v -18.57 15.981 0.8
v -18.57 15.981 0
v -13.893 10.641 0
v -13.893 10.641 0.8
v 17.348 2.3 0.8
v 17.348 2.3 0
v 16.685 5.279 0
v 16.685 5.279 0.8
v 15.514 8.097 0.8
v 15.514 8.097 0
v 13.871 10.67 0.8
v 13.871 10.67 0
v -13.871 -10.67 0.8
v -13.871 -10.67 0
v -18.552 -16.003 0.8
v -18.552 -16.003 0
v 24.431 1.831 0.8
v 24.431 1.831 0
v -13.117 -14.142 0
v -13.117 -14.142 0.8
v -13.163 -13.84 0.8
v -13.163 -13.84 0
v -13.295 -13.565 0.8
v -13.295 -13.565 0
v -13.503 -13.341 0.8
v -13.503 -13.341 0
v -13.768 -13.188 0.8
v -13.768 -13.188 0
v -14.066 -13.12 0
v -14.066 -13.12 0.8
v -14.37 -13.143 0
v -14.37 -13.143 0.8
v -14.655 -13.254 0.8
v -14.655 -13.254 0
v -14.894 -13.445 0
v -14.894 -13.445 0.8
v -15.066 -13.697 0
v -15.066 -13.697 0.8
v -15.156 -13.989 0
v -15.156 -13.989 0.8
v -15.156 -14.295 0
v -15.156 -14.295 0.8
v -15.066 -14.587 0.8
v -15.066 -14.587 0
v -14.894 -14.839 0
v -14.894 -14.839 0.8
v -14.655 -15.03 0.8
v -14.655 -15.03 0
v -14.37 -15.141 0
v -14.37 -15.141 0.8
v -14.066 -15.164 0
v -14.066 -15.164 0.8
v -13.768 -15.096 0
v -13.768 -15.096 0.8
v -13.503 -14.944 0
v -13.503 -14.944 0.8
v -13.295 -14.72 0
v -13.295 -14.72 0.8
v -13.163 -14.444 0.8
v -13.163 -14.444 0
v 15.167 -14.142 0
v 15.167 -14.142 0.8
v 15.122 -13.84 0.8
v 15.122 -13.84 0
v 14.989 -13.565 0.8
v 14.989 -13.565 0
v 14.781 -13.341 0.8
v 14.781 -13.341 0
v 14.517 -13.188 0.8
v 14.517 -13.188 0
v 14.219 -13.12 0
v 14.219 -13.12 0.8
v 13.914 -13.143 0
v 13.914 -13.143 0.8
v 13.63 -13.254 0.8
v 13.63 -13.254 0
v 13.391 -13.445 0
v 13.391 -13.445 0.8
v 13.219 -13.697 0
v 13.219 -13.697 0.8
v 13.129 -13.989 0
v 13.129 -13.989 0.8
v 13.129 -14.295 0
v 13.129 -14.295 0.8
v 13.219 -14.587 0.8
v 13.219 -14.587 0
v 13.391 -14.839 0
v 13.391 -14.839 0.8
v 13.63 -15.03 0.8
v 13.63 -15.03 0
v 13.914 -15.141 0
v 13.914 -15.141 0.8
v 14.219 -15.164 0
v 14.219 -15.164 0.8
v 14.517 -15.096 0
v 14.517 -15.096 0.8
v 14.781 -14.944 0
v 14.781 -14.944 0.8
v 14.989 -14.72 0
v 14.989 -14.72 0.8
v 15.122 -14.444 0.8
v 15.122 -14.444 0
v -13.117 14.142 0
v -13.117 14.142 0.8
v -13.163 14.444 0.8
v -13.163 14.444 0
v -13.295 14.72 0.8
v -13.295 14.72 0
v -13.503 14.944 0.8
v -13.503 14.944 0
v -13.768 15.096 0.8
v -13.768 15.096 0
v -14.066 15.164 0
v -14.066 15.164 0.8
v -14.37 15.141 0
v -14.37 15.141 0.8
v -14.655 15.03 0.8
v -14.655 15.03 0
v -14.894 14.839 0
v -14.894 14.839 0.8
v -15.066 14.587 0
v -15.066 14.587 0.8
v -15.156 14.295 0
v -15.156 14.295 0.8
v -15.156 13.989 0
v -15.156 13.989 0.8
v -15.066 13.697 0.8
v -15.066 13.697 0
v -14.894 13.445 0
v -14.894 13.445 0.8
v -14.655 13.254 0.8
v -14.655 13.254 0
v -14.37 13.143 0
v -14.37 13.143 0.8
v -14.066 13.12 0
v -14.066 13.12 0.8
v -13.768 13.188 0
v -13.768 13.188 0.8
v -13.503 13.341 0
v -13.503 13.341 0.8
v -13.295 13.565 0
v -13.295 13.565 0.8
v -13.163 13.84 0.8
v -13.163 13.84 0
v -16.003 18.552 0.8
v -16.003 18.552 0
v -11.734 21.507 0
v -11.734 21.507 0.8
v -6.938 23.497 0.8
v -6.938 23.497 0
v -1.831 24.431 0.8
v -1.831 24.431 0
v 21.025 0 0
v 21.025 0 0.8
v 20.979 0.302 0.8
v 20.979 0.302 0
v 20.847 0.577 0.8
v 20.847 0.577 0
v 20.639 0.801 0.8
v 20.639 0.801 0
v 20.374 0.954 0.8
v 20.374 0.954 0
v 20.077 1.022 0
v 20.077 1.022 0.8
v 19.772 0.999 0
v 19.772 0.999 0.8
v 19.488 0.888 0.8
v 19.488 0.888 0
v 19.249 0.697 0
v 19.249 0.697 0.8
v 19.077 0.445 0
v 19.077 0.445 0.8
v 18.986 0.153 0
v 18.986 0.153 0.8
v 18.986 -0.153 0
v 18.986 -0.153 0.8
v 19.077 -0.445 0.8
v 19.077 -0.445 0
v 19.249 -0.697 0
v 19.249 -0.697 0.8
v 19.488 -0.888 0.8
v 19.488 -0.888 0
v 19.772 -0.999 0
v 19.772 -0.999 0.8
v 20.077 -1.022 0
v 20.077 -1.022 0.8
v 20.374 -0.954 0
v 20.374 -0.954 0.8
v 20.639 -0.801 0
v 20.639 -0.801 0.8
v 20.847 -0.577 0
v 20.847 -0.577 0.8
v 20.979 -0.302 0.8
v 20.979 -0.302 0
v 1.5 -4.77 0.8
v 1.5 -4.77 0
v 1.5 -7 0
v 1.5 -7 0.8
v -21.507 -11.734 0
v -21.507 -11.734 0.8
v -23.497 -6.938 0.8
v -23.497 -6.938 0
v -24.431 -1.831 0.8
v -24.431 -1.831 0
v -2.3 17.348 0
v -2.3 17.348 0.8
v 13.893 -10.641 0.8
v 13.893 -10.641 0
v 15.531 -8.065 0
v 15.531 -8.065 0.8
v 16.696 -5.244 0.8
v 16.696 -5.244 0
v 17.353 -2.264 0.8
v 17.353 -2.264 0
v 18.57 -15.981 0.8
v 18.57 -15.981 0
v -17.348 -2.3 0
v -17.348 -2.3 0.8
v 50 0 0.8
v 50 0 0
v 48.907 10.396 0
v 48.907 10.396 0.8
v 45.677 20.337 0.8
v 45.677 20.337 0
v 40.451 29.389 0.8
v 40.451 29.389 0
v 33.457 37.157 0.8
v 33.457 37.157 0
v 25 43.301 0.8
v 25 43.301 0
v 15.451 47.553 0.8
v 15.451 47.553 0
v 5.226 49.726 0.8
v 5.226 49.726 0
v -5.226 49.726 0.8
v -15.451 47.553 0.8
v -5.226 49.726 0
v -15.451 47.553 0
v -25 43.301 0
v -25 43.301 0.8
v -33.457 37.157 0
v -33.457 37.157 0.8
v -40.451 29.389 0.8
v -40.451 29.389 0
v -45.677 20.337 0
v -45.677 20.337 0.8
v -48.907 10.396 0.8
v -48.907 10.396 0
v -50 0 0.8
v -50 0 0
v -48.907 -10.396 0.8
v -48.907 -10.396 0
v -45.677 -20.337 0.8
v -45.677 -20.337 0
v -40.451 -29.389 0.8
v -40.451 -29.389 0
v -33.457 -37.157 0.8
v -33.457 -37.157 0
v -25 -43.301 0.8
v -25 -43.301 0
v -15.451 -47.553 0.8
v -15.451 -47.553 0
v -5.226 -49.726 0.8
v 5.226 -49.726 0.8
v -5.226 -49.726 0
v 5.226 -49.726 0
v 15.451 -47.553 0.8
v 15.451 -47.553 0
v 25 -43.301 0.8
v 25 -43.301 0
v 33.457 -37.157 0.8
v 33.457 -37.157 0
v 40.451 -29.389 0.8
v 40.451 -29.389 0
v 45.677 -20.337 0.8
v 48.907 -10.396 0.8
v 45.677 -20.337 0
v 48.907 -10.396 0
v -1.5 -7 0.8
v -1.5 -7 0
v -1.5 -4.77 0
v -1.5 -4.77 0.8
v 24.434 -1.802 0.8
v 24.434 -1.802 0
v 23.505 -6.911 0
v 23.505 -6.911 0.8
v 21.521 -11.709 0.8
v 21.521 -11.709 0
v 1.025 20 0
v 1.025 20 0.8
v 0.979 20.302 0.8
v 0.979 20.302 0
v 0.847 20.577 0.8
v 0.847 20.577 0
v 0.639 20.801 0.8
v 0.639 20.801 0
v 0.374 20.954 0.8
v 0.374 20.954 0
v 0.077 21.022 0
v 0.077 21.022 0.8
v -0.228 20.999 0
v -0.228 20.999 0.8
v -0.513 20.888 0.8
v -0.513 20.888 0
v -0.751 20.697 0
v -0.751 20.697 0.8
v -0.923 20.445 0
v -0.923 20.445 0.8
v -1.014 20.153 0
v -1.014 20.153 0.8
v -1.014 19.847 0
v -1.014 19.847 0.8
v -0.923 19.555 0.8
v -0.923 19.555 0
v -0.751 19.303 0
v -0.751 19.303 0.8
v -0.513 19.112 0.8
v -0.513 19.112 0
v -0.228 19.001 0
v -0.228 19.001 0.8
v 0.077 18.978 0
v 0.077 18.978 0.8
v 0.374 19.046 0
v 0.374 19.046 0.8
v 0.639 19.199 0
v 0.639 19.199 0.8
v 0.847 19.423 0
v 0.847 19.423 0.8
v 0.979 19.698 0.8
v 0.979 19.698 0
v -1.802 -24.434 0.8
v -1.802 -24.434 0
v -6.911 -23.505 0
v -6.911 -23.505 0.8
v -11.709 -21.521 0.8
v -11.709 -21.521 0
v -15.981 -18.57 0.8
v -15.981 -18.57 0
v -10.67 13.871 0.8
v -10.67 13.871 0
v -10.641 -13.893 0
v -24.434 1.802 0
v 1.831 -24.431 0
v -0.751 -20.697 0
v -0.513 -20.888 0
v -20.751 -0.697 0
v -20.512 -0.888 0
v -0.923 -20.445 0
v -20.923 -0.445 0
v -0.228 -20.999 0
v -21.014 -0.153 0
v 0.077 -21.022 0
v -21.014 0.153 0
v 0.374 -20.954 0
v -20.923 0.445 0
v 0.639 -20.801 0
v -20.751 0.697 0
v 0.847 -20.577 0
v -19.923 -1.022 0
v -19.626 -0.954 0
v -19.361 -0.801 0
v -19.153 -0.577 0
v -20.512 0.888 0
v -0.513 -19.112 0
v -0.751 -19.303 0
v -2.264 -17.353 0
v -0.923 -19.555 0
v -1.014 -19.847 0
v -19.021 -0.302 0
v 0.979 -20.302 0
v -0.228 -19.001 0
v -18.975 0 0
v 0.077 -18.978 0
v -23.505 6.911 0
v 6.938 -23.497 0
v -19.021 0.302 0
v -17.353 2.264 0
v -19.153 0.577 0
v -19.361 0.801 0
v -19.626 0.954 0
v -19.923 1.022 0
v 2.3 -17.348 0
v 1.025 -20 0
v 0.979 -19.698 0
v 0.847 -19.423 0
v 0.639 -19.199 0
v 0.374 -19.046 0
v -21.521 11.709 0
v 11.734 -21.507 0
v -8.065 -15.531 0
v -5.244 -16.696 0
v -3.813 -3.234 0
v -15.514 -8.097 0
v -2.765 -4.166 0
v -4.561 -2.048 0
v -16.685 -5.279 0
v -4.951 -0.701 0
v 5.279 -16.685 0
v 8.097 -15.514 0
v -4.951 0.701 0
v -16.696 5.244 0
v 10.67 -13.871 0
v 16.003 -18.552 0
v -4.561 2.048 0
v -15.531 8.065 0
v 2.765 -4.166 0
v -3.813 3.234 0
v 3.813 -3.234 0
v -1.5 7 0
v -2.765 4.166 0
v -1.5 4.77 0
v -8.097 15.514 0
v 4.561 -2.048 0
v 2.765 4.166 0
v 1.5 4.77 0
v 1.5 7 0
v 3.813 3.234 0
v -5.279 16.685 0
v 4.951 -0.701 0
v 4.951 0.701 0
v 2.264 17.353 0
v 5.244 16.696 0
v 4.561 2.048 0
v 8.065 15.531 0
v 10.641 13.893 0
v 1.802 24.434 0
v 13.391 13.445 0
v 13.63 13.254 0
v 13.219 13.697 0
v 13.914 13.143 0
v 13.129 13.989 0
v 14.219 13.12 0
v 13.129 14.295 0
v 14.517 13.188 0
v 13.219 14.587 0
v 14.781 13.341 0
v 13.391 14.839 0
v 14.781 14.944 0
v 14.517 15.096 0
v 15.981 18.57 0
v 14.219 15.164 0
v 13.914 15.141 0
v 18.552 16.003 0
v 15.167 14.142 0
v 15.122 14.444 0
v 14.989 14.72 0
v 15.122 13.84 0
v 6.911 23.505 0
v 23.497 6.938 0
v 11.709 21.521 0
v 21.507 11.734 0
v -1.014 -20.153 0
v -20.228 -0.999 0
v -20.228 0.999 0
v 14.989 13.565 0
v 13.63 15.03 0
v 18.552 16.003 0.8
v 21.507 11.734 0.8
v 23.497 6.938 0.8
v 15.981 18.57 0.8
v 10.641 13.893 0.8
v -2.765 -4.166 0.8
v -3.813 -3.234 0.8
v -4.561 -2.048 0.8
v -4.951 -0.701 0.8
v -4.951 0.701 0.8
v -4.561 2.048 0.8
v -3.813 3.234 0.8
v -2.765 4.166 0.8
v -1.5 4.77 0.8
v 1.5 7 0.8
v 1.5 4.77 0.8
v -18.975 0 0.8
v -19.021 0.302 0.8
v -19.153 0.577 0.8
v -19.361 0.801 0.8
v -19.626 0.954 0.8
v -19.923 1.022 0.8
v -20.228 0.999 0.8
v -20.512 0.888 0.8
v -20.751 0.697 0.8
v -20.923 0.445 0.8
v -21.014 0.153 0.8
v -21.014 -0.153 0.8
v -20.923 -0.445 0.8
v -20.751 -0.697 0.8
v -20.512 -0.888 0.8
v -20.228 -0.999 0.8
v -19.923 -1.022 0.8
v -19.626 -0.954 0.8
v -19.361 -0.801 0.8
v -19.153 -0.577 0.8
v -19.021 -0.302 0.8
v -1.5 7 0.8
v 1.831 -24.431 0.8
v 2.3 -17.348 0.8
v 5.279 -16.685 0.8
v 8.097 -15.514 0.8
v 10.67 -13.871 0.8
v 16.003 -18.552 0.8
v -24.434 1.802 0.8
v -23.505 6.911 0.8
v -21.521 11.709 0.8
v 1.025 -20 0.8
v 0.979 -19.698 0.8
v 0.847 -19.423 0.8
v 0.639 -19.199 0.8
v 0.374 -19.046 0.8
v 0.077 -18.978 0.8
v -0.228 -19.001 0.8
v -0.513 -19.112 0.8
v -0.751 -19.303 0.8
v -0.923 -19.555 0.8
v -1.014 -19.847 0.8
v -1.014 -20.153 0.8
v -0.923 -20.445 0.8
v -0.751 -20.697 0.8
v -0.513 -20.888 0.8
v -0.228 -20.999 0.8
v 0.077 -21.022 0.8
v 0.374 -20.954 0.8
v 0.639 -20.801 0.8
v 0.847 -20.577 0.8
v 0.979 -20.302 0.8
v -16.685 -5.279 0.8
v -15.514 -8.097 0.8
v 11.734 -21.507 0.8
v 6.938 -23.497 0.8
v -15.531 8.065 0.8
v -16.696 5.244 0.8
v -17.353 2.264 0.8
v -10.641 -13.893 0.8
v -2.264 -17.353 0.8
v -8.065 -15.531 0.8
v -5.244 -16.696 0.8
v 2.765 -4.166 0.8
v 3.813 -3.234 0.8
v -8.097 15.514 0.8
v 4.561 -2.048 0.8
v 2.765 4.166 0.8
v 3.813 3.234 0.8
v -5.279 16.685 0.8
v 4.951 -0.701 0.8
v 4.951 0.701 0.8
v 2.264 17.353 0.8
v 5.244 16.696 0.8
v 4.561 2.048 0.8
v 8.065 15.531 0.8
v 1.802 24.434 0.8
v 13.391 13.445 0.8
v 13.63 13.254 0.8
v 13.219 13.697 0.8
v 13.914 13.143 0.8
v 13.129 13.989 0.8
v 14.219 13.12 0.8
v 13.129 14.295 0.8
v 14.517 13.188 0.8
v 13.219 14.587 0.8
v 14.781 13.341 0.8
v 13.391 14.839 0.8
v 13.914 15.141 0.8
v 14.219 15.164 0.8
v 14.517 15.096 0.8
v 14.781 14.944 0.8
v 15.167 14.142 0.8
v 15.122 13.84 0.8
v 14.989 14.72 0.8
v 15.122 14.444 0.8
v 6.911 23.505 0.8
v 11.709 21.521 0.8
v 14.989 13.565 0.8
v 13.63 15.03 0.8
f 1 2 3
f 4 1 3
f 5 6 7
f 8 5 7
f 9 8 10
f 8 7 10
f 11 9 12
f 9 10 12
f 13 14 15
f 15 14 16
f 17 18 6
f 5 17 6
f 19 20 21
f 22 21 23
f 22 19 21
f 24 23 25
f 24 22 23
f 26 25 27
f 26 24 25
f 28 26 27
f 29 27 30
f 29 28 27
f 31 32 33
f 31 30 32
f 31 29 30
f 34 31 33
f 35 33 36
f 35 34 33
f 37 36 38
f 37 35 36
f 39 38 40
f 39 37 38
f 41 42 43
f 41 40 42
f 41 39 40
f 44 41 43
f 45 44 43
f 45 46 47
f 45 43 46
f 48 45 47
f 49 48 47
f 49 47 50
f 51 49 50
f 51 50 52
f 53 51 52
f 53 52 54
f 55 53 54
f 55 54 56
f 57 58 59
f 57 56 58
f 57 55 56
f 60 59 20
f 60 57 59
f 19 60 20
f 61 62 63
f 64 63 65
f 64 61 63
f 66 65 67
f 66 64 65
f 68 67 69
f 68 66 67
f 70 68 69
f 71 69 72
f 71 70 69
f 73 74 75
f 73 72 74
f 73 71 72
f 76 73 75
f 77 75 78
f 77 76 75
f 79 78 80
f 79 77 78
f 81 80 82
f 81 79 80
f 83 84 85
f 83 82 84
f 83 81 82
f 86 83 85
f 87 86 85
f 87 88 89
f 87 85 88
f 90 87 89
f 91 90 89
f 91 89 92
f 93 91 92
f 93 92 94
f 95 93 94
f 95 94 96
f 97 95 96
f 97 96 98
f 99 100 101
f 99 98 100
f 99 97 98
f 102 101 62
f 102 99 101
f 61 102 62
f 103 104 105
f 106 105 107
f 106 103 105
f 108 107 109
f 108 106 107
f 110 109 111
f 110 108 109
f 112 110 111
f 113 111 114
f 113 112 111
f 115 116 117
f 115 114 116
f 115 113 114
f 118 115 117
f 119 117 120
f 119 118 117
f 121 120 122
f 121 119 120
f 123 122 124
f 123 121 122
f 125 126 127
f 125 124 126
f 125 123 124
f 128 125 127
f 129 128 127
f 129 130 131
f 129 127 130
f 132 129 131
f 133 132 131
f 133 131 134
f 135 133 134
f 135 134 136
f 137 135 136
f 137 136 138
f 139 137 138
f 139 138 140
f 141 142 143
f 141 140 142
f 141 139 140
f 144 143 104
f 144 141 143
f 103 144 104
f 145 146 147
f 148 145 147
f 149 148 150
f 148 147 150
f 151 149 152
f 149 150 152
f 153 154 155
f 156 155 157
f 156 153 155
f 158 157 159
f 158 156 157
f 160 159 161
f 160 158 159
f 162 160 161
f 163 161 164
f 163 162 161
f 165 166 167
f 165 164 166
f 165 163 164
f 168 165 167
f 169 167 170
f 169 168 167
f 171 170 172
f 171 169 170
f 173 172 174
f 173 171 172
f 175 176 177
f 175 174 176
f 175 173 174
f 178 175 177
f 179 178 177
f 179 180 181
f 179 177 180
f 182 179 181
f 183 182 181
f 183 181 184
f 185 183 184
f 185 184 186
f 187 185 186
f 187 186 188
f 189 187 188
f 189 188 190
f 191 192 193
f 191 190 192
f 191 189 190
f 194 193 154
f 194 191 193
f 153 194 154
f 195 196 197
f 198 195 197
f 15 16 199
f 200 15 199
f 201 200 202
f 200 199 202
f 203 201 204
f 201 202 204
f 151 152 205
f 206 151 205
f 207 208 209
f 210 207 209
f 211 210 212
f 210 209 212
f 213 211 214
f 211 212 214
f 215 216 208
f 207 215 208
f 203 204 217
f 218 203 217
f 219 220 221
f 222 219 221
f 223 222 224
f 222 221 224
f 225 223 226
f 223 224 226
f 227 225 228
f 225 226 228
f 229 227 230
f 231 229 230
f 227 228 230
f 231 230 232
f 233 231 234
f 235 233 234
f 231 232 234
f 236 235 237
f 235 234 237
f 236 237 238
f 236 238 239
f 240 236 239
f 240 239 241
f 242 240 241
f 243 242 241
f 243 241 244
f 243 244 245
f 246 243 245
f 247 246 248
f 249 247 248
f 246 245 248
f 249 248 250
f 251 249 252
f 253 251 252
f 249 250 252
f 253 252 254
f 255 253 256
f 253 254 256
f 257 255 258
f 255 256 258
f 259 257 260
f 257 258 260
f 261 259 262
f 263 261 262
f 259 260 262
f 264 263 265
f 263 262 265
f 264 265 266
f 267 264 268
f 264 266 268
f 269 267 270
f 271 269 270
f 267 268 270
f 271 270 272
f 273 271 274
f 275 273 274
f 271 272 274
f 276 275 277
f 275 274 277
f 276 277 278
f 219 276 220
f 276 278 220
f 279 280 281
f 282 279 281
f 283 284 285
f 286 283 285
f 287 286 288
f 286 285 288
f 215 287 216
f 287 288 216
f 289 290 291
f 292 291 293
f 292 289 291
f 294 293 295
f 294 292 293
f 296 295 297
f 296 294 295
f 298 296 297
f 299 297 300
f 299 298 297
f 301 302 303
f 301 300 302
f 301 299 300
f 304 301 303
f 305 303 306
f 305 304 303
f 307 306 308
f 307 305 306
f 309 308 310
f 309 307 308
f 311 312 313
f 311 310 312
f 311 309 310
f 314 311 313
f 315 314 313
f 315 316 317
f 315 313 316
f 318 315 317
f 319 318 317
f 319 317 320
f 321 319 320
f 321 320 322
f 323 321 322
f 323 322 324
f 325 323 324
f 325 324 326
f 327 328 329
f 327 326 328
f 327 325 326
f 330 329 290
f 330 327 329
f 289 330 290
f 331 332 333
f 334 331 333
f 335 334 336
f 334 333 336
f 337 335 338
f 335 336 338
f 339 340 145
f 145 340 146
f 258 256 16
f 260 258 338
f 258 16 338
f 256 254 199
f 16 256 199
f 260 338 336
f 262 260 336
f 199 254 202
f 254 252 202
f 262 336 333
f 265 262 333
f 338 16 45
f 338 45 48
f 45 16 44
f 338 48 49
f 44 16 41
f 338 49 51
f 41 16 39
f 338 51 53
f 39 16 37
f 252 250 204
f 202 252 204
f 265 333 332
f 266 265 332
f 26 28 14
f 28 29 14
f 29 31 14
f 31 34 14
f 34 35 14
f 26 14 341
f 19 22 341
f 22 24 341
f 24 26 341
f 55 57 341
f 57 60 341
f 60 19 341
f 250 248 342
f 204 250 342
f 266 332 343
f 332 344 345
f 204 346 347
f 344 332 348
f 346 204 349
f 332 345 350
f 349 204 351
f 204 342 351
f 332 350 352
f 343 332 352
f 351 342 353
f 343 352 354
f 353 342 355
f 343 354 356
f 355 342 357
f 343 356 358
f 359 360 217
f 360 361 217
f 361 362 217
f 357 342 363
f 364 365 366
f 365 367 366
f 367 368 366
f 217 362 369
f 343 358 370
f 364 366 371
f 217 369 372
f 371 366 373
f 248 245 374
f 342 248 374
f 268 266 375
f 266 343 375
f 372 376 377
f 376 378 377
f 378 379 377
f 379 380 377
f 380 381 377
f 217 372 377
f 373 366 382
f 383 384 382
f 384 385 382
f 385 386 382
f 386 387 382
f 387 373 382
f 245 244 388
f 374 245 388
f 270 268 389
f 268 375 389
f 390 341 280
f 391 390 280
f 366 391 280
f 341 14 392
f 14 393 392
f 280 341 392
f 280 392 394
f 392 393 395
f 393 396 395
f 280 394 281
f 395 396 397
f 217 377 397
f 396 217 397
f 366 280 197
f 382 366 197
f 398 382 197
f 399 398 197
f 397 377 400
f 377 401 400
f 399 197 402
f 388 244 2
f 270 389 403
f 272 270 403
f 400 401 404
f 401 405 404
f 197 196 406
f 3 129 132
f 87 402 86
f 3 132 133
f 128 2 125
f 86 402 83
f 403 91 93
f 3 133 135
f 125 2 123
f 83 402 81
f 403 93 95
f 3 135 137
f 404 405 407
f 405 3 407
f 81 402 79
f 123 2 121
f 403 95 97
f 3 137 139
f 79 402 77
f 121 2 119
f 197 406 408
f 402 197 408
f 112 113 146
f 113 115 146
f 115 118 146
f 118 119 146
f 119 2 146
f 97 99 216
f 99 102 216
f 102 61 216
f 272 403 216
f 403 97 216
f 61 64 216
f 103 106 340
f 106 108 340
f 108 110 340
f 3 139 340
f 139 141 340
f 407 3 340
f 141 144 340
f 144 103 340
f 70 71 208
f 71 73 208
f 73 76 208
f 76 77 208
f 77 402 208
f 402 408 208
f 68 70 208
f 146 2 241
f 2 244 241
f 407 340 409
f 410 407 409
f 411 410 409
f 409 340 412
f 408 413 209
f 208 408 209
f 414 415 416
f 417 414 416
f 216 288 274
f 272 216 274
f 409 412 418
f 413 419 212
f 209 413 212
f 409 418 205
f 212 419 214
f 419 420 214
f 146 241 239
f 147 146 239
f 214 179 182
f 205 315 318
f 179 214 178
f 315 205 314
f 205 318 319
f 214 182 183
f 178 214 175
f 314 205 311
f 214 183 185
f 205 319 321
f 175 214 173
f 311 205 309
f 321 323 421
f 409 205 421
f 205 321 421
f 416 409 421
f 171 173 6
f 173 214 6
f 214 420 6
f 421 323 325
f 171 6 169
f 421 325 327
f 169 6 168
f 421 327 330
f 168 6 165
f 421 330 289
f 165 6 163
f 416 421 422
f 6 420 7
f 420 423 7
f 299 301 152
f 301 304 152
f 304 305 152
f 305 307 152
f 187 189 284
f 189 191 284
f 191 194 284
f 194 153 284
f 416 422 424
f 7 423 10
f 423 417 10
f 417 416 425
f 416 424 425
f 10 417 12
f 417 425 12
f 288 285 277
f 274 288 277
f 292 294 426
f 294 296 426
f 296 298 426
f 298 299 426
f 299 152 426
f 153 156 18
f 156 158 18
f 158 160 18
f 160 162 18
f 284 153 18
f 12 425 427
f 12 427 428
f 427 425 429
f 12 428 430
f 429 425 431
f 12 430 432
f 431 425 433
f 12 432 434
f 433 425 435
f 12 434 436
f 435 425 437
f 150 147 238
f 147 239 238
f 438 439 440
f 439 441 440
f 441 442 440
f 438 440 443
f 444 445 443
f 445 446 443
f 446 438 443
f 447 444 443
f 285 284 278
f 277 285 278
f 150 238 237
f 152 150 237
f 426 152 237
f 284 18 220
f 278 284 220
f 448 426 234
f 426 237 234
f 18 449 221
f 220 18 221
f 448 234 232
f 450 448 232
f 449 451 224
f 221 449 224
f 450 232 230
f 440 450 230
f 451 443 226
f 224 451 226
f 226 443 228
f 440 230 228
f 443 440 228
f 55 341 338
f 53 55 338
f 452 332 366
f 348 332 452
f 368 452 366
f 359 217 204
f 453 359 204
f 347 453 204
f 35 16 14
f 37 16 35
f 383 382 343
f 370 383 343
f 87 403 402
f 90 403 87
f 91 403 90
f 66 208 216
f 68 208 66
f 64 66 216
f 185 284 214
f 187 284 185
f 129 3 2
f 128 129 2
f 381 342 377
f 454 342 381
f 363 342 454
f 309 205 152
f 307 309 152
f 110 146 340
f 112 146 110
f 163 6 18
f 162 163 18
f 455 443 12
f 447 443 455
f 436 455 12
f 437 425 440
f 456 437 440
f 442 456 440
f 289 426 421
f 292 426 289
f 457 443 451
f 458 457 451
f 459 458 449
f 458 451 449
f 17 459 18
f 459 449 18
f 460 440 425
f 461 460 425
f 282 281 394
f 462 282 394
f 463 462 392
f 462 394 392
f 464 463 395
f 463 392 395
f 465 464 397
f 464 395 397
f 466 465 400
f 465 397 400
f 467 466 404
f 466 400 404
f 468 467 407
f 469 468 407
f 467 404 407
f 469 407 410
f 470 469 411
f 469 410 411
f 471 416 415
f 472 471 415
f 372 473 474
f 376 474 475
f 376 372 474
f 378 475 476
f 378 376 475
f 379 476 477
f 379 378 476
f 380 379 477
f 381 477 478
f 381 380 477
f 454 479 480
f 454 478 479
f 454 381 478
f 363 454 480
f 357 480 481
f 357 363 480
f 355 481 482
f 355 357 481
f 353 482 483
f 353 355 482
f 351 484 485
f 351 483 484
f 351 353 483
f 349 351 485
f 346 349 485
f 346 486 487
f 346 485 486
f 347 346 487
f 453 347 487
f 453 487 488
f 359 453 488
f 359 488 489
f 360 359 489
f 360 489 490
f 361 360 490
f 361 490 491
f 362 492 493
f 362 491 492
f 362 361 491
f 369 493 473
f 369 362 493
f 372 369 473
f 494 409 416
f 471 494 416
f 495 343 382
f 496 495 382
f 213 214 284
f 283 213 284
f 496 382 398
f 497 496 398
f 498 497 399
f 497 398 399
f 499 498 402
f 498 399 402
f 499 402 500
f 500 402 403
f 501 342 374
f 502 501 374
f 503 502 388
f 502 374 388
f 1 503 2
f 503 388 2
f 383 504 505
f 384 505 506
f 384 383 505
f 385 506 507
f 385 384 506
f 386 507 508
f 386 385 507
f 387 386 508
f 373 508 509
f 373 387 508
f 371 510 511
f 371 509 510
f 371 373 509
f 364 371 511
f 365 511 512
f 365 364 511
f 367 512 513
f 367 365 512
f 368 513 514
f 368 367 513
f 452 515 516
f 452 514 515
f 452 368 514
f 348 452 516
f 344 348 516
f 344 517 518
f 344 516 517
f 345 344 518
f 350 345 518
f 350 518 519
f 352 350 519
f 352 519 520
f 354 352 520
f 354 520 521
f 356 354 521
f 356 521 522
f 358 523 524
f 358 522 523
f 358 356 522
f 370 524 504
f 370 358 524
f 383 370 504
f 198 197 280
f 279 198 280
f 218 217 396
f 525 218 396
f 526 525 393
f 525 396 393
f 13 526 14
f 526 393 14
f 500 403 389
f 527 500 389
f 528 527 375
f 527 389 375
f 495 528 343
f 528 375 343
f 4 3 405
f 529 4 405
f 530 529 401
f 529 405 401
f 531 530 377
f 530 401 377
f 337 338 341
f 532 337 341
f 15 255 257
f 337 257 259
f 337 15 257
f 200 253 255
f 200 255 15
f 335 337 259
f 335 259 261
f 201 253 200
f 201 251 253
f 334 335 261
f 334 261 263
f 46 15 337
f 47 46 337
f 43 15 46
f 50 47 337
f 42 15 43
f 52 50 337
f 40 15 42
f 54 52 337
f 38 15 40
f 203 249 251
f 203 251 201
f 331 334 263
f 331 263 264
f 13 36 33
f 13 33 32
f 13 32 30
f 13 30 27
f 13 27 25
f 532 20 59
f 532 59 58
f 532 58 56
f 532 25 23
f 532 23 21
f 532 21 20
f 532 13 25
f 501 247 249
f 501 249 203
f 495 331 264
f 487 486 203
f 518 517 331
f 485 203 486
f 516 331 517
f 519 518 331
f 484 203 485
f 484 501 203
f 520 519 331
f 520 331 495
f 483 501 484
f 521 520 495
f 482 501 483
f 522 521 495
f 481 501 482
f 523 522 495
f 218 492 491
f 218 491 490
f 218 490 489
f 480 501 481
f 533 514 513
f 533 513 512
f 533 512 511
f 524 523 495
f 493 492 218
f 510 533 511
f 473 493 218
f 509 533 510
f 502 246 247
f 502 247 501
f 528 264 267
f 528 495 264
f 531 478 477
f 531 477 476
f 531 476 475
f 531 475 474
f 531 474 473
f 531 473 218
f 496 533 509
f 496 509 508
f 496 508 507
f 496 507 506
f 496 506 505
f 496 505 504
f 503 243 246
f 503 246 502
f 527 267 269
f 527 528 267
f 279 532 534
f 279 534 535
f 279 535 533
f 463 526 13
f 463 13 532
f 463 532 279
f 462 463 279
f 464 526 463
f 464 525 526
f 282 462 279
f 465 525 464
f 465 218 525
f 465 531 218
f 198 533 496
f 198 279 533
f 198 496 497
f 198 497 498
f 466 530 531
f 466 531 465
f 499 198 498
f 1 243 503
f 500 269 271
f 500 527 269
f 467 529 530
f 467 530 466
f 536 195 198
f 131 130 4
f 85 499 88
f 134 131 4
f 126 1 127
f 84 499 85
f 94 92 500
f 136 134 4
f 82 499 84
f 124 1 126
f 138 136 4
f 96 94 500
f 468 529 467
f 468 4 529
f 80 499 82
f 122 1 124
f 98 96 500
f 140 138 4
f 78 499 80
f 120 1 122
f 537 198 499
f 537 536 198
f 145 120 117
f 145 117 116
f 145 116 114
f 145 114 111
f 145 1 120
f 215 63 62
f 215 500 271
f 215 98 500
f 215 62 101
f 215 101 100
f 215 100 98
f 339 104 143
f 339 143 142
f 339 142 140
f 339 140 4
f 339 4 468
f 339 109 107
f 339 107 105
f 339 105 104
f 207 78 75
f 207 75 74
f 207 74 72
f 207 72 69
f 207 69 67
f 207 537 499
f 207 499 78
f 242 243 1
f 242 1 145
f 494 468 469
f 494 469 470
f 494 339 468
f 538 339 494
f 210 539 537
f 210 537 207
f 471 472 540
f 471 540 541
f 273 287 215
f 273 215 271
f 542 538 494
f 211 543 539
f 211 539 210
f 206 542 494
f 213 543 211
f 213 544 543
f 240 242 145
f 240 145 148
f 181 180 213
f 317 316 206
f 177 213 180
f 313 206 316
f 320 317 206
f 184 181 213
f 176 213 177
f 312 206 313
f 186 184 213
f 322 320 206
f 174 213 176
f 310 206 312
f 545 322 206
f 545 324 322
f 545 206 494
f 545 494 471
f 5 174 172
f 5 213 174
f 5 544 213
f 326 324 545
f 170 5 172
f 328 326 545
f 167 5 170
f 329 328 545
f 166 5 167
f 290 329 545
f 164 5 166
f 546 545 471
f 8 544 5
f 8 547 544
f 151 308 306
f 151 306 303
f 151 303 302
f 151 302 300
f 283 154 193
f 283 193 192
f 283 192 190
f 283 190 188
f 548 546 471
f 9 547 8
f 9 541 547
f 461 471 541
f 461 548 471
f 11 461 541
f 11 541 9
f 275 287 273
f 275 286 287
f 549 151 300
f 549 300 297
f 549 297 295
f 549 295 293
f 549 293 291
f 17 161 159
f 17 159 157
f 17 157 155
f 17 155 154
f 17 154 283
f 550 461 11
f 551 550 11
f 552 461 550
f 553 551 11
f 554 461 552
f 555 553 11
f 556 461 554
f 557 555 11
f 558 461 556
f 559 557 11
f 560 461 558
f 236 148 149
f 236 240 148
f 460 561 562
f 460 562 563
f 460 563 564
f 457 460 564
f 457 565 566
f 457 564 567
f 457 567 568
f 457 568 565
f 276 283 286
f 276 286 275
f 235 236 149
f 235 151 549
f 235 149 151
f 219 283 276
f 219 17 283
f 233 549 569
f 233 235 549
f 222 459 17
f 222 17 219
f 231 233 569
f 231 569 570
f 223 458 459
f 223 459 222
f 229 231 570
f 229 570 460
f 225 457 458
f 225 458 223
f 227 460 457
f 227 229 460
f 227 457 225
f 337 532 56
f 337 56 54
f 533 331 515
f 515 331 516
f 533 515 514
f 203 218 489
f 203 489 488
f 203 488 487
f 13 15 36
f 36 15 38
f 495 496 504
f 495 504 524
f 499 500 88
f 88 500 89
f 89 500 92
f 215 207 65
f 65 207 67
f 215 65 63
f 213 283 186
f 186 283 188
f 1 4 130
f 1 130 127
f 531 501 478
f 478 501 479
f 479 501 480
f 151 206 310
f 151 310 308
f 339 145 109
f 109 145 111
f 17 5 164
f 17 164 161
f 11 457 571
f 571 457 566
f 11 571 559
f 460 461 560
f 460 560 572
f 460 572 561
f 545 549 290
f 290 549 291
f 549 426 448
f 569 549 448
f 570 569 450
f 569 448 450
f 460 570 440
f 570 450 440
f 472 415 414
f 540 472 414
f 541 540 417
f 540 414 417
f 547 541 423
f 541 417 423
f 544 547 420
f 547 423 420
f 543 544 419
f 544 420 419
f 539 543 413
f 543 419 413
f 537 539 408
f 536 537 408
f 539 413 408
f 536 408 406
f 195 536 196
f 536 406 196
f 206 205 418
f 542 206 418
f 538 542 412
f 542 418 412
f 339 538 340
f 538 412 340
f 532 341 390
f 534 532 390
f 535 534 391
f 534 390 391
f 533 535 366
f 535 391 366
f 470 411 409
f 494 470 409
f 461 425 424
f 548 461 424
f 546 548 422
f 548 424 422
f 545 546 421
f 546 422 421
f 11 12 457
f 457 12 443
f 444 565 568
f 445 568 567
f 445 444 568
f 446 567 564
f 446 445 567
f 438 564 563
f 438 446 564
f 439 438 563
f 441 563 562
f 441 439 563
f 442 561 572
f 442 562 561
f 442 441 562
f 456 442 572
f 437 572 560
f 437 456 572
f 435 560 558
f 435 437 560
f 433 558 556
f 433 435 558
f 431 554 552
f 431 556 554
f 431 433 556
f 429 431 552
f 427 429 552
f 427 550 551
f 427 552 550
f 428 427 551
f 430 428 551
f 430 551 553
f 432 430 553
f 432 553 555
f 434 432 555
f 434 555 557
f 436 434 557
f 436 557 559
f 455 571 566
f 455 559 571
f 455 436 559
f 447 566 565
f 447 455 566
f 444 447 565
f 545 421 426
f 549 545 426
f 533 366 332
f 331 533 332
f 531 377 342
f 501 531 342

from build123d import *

# Parameters (mm, degrees)
BOSS_EXTRUDE1_OUTLINE_R = 50
BOSS_EXTRUDE1_DEPTH     = 0.8
SKETCH2_R               = 1.025
CUT_EXTRUDE5_DEPTH      = 10


# Read off the part's stored shape, not the designer's step: Boss-Extrude1
with BuildPart() as part:
    # Boss-Extrude1 outline → Boss-Extrude1 (new body)
    with BuildSketch(Plane.XY):
        Circle(BOSS_EXTRUDE1_OUTLINE_R)
        with BuildLine():
            ThreePointArc((-10.640683383, -13.893374577), (-6.680080661, -16.174873179), (-2.263779528, -17.352962348))
            Line((-2.263779528, -17.352962348), (-1.802339331, -24.433615634))
            ThreePointArc((-1.802339331, -24.433615634), (-9.36241701, -22.64056421), (-15.980874836, -18.570450707))
            Line((-15.980874836, -18.570450707), (-10.640683383, -13.893374577))
        make_face(mode=Mode.SUBTRACT)
        with BuildLine():
            ThreePointArc((-17.348198754, -2.3), (-16.160892844, -6.713832175), (-13.871131205, -10.669663495))
            Line((-13.871131205, -10.669663495), (-18.551621667, -16.00272894))
            ThreePointArc((-18.551621667, -16.00272894), (-22.629525039, -9.389067926), (-24.431476591, -1.831106659))
            Line((-24.431476591, -1.831106659), (-17.348198754, -2.3))
        make_face(mode=Mode.SUBTRACT)
        with BuildLine():
            ThreePointArc((2.3, -17.348198754), (6.713832175, -16.160892844), (10.669663495, -13.871131205))
            Line((10.669663495, -13.871131205), (16.00272894, -18.551621667))
            ThreePointArc((16.00272894, -18.551621667), (9.389067926, -22.629525039), (1.831106659, -24.431476591))
            Line((1.831106659, -24.431476591), (2.3, -17.348198754))
        make_face(mode=Mode.SUBTRACT)
        with BuildLine():
            ThreePointArc((13.893374577, -10.640683383), (16.174873179, -6.680080661), (17.352962348, -2.263779528))
            Line((17.352962348, -2.263779528), (24.433615634, -1.802339331))
            ThreePointArc((24.433615634, -1.802339331), (22.64056421, -9.36241701), (18.570450707, -15.980874836))
            Line((18.570450707, -15.980874836), (13.893374577, -10.640683383))
        make_face(mode=Mode.SUBTRACT)
        with BuildLine():
            ThreePointArc((-13.893374577, 10.640683383), (-16.174873179, 6.680080661), (-17.352962348, 2.263779528))
            Line((-17.352962348, 2.263779528), (-24.433615634, 1.802339331))
            ThreePointArc((-24.433615634, 1.802339331), (-22.64056421, 9.36241701), (-18.570450707, 15.980874836))
            Line((-18.570450707, 15.980874836), (-13.893374577, 10.640683383))
        make_face(mode=Mode.SUBTRACT)
        with BuildLine():
            ThreePointArc((-2.3, 17.348198754), (-6.713832175, 16.160892844), (-10.669663495, 13.871131205))
            Line((-10.669663495, 13.871131205), (-16.00272894, 18.551621667))
            ThreePointArc((-16.00272894, 18.551621667), (-9.389067926, 22.629525039), (-1.831106659, 24.431476591))
            Line((-1.831106659, 24.431476591), (-2.3, 17.348198754))
        make_face(mode=Mode.SUBTRACT)
        with BuildLine():
            ThreePointArc((-1.5, -4.769696007), (-5, 0), (-1.5, 4.769696007))
            Line((-1.5, 4.769696007), (-1.5, 7))
            Line((-1.5, 7), (1.5, 7))
            Line((1.5, 7), (1.5, 4.769696007))
            ThreePointArc((1.5, 4.769696007), (5, 0), (1.5, -4.769696007))
            Line((1.5, -4.769696007), (1.5, -7))
            Line((1.5, -7), (-1.5, -7))
            Line((-1.5, -7), (-1.5, -4.769696007))
        make_face(mode=Mode.SUBTRACT)
        with BuildLine():
            ThreePointArc((17.348198754, 2.3), (16.160892844, 6.713832175), (13.871131205, 10.669663495))
            Line((13.871131205, 10.669663495), (18.551621667, 16.00272894))
            ThreePointArc((18.551621667, 16.00272894), (22.629525039, 9.389067926), (24.431476591, 1.831106659))
            Line((24.431476591, 1.831106659), (17.348198754, 2.3))
        make_face(mode=Mode.SUBTRACT)
        with BuildLine():
            ThreePointArc((10.640683383, 13.893374577), (6.680080661, 16.174873179), (2.263779528, 17.352962348))
            Line((2.263779528, 17.352962348), (1.802339331, 24.433615634))
            ThreePointArc((1.802339331, 24.433615634), (9.36241701, 22.64056421), (15.980874836, 18.570450707))
            Line((15.980874836, 18.570450707), (10.640683383, 13.893374577))
        make_face(mode=Mode.SUBTRACT)
    extrude(amount=BOSS_EXTRUDE1_DEPTH)

    # Sketch2 → Cut-Extrude5 (cut)
    with BuildSketch(Plane.XY):
        with Locations((0, 20)):
            Circle(SKETCH2_R)
        with Locations((14.142135624, 14.142135624)):
            Circle(SKETCH2_R)
        with Locations((20, 0)):
            Circle(SKETCH2_R)
        with Locations((14.142135624, -14.142135624)):
            Circle(SKETCH2_R)
        with Locations((0, -20)):
            Circle(SKETCH2_R)
        with Locations((-14.142135624, -14.142135624)):
            Circle(SKETCH2_R)
        with Locations((-20, 0)):
            Circle(SKETCH2_R)
        with Locations((-14.142135624, 14.142135624)):
            Circle(SKETCH2_R)
    extrude(amount=CUT_EXTRUDE5_DEPTH, mode=Mode.SUBTRACT)


solid = part.part
